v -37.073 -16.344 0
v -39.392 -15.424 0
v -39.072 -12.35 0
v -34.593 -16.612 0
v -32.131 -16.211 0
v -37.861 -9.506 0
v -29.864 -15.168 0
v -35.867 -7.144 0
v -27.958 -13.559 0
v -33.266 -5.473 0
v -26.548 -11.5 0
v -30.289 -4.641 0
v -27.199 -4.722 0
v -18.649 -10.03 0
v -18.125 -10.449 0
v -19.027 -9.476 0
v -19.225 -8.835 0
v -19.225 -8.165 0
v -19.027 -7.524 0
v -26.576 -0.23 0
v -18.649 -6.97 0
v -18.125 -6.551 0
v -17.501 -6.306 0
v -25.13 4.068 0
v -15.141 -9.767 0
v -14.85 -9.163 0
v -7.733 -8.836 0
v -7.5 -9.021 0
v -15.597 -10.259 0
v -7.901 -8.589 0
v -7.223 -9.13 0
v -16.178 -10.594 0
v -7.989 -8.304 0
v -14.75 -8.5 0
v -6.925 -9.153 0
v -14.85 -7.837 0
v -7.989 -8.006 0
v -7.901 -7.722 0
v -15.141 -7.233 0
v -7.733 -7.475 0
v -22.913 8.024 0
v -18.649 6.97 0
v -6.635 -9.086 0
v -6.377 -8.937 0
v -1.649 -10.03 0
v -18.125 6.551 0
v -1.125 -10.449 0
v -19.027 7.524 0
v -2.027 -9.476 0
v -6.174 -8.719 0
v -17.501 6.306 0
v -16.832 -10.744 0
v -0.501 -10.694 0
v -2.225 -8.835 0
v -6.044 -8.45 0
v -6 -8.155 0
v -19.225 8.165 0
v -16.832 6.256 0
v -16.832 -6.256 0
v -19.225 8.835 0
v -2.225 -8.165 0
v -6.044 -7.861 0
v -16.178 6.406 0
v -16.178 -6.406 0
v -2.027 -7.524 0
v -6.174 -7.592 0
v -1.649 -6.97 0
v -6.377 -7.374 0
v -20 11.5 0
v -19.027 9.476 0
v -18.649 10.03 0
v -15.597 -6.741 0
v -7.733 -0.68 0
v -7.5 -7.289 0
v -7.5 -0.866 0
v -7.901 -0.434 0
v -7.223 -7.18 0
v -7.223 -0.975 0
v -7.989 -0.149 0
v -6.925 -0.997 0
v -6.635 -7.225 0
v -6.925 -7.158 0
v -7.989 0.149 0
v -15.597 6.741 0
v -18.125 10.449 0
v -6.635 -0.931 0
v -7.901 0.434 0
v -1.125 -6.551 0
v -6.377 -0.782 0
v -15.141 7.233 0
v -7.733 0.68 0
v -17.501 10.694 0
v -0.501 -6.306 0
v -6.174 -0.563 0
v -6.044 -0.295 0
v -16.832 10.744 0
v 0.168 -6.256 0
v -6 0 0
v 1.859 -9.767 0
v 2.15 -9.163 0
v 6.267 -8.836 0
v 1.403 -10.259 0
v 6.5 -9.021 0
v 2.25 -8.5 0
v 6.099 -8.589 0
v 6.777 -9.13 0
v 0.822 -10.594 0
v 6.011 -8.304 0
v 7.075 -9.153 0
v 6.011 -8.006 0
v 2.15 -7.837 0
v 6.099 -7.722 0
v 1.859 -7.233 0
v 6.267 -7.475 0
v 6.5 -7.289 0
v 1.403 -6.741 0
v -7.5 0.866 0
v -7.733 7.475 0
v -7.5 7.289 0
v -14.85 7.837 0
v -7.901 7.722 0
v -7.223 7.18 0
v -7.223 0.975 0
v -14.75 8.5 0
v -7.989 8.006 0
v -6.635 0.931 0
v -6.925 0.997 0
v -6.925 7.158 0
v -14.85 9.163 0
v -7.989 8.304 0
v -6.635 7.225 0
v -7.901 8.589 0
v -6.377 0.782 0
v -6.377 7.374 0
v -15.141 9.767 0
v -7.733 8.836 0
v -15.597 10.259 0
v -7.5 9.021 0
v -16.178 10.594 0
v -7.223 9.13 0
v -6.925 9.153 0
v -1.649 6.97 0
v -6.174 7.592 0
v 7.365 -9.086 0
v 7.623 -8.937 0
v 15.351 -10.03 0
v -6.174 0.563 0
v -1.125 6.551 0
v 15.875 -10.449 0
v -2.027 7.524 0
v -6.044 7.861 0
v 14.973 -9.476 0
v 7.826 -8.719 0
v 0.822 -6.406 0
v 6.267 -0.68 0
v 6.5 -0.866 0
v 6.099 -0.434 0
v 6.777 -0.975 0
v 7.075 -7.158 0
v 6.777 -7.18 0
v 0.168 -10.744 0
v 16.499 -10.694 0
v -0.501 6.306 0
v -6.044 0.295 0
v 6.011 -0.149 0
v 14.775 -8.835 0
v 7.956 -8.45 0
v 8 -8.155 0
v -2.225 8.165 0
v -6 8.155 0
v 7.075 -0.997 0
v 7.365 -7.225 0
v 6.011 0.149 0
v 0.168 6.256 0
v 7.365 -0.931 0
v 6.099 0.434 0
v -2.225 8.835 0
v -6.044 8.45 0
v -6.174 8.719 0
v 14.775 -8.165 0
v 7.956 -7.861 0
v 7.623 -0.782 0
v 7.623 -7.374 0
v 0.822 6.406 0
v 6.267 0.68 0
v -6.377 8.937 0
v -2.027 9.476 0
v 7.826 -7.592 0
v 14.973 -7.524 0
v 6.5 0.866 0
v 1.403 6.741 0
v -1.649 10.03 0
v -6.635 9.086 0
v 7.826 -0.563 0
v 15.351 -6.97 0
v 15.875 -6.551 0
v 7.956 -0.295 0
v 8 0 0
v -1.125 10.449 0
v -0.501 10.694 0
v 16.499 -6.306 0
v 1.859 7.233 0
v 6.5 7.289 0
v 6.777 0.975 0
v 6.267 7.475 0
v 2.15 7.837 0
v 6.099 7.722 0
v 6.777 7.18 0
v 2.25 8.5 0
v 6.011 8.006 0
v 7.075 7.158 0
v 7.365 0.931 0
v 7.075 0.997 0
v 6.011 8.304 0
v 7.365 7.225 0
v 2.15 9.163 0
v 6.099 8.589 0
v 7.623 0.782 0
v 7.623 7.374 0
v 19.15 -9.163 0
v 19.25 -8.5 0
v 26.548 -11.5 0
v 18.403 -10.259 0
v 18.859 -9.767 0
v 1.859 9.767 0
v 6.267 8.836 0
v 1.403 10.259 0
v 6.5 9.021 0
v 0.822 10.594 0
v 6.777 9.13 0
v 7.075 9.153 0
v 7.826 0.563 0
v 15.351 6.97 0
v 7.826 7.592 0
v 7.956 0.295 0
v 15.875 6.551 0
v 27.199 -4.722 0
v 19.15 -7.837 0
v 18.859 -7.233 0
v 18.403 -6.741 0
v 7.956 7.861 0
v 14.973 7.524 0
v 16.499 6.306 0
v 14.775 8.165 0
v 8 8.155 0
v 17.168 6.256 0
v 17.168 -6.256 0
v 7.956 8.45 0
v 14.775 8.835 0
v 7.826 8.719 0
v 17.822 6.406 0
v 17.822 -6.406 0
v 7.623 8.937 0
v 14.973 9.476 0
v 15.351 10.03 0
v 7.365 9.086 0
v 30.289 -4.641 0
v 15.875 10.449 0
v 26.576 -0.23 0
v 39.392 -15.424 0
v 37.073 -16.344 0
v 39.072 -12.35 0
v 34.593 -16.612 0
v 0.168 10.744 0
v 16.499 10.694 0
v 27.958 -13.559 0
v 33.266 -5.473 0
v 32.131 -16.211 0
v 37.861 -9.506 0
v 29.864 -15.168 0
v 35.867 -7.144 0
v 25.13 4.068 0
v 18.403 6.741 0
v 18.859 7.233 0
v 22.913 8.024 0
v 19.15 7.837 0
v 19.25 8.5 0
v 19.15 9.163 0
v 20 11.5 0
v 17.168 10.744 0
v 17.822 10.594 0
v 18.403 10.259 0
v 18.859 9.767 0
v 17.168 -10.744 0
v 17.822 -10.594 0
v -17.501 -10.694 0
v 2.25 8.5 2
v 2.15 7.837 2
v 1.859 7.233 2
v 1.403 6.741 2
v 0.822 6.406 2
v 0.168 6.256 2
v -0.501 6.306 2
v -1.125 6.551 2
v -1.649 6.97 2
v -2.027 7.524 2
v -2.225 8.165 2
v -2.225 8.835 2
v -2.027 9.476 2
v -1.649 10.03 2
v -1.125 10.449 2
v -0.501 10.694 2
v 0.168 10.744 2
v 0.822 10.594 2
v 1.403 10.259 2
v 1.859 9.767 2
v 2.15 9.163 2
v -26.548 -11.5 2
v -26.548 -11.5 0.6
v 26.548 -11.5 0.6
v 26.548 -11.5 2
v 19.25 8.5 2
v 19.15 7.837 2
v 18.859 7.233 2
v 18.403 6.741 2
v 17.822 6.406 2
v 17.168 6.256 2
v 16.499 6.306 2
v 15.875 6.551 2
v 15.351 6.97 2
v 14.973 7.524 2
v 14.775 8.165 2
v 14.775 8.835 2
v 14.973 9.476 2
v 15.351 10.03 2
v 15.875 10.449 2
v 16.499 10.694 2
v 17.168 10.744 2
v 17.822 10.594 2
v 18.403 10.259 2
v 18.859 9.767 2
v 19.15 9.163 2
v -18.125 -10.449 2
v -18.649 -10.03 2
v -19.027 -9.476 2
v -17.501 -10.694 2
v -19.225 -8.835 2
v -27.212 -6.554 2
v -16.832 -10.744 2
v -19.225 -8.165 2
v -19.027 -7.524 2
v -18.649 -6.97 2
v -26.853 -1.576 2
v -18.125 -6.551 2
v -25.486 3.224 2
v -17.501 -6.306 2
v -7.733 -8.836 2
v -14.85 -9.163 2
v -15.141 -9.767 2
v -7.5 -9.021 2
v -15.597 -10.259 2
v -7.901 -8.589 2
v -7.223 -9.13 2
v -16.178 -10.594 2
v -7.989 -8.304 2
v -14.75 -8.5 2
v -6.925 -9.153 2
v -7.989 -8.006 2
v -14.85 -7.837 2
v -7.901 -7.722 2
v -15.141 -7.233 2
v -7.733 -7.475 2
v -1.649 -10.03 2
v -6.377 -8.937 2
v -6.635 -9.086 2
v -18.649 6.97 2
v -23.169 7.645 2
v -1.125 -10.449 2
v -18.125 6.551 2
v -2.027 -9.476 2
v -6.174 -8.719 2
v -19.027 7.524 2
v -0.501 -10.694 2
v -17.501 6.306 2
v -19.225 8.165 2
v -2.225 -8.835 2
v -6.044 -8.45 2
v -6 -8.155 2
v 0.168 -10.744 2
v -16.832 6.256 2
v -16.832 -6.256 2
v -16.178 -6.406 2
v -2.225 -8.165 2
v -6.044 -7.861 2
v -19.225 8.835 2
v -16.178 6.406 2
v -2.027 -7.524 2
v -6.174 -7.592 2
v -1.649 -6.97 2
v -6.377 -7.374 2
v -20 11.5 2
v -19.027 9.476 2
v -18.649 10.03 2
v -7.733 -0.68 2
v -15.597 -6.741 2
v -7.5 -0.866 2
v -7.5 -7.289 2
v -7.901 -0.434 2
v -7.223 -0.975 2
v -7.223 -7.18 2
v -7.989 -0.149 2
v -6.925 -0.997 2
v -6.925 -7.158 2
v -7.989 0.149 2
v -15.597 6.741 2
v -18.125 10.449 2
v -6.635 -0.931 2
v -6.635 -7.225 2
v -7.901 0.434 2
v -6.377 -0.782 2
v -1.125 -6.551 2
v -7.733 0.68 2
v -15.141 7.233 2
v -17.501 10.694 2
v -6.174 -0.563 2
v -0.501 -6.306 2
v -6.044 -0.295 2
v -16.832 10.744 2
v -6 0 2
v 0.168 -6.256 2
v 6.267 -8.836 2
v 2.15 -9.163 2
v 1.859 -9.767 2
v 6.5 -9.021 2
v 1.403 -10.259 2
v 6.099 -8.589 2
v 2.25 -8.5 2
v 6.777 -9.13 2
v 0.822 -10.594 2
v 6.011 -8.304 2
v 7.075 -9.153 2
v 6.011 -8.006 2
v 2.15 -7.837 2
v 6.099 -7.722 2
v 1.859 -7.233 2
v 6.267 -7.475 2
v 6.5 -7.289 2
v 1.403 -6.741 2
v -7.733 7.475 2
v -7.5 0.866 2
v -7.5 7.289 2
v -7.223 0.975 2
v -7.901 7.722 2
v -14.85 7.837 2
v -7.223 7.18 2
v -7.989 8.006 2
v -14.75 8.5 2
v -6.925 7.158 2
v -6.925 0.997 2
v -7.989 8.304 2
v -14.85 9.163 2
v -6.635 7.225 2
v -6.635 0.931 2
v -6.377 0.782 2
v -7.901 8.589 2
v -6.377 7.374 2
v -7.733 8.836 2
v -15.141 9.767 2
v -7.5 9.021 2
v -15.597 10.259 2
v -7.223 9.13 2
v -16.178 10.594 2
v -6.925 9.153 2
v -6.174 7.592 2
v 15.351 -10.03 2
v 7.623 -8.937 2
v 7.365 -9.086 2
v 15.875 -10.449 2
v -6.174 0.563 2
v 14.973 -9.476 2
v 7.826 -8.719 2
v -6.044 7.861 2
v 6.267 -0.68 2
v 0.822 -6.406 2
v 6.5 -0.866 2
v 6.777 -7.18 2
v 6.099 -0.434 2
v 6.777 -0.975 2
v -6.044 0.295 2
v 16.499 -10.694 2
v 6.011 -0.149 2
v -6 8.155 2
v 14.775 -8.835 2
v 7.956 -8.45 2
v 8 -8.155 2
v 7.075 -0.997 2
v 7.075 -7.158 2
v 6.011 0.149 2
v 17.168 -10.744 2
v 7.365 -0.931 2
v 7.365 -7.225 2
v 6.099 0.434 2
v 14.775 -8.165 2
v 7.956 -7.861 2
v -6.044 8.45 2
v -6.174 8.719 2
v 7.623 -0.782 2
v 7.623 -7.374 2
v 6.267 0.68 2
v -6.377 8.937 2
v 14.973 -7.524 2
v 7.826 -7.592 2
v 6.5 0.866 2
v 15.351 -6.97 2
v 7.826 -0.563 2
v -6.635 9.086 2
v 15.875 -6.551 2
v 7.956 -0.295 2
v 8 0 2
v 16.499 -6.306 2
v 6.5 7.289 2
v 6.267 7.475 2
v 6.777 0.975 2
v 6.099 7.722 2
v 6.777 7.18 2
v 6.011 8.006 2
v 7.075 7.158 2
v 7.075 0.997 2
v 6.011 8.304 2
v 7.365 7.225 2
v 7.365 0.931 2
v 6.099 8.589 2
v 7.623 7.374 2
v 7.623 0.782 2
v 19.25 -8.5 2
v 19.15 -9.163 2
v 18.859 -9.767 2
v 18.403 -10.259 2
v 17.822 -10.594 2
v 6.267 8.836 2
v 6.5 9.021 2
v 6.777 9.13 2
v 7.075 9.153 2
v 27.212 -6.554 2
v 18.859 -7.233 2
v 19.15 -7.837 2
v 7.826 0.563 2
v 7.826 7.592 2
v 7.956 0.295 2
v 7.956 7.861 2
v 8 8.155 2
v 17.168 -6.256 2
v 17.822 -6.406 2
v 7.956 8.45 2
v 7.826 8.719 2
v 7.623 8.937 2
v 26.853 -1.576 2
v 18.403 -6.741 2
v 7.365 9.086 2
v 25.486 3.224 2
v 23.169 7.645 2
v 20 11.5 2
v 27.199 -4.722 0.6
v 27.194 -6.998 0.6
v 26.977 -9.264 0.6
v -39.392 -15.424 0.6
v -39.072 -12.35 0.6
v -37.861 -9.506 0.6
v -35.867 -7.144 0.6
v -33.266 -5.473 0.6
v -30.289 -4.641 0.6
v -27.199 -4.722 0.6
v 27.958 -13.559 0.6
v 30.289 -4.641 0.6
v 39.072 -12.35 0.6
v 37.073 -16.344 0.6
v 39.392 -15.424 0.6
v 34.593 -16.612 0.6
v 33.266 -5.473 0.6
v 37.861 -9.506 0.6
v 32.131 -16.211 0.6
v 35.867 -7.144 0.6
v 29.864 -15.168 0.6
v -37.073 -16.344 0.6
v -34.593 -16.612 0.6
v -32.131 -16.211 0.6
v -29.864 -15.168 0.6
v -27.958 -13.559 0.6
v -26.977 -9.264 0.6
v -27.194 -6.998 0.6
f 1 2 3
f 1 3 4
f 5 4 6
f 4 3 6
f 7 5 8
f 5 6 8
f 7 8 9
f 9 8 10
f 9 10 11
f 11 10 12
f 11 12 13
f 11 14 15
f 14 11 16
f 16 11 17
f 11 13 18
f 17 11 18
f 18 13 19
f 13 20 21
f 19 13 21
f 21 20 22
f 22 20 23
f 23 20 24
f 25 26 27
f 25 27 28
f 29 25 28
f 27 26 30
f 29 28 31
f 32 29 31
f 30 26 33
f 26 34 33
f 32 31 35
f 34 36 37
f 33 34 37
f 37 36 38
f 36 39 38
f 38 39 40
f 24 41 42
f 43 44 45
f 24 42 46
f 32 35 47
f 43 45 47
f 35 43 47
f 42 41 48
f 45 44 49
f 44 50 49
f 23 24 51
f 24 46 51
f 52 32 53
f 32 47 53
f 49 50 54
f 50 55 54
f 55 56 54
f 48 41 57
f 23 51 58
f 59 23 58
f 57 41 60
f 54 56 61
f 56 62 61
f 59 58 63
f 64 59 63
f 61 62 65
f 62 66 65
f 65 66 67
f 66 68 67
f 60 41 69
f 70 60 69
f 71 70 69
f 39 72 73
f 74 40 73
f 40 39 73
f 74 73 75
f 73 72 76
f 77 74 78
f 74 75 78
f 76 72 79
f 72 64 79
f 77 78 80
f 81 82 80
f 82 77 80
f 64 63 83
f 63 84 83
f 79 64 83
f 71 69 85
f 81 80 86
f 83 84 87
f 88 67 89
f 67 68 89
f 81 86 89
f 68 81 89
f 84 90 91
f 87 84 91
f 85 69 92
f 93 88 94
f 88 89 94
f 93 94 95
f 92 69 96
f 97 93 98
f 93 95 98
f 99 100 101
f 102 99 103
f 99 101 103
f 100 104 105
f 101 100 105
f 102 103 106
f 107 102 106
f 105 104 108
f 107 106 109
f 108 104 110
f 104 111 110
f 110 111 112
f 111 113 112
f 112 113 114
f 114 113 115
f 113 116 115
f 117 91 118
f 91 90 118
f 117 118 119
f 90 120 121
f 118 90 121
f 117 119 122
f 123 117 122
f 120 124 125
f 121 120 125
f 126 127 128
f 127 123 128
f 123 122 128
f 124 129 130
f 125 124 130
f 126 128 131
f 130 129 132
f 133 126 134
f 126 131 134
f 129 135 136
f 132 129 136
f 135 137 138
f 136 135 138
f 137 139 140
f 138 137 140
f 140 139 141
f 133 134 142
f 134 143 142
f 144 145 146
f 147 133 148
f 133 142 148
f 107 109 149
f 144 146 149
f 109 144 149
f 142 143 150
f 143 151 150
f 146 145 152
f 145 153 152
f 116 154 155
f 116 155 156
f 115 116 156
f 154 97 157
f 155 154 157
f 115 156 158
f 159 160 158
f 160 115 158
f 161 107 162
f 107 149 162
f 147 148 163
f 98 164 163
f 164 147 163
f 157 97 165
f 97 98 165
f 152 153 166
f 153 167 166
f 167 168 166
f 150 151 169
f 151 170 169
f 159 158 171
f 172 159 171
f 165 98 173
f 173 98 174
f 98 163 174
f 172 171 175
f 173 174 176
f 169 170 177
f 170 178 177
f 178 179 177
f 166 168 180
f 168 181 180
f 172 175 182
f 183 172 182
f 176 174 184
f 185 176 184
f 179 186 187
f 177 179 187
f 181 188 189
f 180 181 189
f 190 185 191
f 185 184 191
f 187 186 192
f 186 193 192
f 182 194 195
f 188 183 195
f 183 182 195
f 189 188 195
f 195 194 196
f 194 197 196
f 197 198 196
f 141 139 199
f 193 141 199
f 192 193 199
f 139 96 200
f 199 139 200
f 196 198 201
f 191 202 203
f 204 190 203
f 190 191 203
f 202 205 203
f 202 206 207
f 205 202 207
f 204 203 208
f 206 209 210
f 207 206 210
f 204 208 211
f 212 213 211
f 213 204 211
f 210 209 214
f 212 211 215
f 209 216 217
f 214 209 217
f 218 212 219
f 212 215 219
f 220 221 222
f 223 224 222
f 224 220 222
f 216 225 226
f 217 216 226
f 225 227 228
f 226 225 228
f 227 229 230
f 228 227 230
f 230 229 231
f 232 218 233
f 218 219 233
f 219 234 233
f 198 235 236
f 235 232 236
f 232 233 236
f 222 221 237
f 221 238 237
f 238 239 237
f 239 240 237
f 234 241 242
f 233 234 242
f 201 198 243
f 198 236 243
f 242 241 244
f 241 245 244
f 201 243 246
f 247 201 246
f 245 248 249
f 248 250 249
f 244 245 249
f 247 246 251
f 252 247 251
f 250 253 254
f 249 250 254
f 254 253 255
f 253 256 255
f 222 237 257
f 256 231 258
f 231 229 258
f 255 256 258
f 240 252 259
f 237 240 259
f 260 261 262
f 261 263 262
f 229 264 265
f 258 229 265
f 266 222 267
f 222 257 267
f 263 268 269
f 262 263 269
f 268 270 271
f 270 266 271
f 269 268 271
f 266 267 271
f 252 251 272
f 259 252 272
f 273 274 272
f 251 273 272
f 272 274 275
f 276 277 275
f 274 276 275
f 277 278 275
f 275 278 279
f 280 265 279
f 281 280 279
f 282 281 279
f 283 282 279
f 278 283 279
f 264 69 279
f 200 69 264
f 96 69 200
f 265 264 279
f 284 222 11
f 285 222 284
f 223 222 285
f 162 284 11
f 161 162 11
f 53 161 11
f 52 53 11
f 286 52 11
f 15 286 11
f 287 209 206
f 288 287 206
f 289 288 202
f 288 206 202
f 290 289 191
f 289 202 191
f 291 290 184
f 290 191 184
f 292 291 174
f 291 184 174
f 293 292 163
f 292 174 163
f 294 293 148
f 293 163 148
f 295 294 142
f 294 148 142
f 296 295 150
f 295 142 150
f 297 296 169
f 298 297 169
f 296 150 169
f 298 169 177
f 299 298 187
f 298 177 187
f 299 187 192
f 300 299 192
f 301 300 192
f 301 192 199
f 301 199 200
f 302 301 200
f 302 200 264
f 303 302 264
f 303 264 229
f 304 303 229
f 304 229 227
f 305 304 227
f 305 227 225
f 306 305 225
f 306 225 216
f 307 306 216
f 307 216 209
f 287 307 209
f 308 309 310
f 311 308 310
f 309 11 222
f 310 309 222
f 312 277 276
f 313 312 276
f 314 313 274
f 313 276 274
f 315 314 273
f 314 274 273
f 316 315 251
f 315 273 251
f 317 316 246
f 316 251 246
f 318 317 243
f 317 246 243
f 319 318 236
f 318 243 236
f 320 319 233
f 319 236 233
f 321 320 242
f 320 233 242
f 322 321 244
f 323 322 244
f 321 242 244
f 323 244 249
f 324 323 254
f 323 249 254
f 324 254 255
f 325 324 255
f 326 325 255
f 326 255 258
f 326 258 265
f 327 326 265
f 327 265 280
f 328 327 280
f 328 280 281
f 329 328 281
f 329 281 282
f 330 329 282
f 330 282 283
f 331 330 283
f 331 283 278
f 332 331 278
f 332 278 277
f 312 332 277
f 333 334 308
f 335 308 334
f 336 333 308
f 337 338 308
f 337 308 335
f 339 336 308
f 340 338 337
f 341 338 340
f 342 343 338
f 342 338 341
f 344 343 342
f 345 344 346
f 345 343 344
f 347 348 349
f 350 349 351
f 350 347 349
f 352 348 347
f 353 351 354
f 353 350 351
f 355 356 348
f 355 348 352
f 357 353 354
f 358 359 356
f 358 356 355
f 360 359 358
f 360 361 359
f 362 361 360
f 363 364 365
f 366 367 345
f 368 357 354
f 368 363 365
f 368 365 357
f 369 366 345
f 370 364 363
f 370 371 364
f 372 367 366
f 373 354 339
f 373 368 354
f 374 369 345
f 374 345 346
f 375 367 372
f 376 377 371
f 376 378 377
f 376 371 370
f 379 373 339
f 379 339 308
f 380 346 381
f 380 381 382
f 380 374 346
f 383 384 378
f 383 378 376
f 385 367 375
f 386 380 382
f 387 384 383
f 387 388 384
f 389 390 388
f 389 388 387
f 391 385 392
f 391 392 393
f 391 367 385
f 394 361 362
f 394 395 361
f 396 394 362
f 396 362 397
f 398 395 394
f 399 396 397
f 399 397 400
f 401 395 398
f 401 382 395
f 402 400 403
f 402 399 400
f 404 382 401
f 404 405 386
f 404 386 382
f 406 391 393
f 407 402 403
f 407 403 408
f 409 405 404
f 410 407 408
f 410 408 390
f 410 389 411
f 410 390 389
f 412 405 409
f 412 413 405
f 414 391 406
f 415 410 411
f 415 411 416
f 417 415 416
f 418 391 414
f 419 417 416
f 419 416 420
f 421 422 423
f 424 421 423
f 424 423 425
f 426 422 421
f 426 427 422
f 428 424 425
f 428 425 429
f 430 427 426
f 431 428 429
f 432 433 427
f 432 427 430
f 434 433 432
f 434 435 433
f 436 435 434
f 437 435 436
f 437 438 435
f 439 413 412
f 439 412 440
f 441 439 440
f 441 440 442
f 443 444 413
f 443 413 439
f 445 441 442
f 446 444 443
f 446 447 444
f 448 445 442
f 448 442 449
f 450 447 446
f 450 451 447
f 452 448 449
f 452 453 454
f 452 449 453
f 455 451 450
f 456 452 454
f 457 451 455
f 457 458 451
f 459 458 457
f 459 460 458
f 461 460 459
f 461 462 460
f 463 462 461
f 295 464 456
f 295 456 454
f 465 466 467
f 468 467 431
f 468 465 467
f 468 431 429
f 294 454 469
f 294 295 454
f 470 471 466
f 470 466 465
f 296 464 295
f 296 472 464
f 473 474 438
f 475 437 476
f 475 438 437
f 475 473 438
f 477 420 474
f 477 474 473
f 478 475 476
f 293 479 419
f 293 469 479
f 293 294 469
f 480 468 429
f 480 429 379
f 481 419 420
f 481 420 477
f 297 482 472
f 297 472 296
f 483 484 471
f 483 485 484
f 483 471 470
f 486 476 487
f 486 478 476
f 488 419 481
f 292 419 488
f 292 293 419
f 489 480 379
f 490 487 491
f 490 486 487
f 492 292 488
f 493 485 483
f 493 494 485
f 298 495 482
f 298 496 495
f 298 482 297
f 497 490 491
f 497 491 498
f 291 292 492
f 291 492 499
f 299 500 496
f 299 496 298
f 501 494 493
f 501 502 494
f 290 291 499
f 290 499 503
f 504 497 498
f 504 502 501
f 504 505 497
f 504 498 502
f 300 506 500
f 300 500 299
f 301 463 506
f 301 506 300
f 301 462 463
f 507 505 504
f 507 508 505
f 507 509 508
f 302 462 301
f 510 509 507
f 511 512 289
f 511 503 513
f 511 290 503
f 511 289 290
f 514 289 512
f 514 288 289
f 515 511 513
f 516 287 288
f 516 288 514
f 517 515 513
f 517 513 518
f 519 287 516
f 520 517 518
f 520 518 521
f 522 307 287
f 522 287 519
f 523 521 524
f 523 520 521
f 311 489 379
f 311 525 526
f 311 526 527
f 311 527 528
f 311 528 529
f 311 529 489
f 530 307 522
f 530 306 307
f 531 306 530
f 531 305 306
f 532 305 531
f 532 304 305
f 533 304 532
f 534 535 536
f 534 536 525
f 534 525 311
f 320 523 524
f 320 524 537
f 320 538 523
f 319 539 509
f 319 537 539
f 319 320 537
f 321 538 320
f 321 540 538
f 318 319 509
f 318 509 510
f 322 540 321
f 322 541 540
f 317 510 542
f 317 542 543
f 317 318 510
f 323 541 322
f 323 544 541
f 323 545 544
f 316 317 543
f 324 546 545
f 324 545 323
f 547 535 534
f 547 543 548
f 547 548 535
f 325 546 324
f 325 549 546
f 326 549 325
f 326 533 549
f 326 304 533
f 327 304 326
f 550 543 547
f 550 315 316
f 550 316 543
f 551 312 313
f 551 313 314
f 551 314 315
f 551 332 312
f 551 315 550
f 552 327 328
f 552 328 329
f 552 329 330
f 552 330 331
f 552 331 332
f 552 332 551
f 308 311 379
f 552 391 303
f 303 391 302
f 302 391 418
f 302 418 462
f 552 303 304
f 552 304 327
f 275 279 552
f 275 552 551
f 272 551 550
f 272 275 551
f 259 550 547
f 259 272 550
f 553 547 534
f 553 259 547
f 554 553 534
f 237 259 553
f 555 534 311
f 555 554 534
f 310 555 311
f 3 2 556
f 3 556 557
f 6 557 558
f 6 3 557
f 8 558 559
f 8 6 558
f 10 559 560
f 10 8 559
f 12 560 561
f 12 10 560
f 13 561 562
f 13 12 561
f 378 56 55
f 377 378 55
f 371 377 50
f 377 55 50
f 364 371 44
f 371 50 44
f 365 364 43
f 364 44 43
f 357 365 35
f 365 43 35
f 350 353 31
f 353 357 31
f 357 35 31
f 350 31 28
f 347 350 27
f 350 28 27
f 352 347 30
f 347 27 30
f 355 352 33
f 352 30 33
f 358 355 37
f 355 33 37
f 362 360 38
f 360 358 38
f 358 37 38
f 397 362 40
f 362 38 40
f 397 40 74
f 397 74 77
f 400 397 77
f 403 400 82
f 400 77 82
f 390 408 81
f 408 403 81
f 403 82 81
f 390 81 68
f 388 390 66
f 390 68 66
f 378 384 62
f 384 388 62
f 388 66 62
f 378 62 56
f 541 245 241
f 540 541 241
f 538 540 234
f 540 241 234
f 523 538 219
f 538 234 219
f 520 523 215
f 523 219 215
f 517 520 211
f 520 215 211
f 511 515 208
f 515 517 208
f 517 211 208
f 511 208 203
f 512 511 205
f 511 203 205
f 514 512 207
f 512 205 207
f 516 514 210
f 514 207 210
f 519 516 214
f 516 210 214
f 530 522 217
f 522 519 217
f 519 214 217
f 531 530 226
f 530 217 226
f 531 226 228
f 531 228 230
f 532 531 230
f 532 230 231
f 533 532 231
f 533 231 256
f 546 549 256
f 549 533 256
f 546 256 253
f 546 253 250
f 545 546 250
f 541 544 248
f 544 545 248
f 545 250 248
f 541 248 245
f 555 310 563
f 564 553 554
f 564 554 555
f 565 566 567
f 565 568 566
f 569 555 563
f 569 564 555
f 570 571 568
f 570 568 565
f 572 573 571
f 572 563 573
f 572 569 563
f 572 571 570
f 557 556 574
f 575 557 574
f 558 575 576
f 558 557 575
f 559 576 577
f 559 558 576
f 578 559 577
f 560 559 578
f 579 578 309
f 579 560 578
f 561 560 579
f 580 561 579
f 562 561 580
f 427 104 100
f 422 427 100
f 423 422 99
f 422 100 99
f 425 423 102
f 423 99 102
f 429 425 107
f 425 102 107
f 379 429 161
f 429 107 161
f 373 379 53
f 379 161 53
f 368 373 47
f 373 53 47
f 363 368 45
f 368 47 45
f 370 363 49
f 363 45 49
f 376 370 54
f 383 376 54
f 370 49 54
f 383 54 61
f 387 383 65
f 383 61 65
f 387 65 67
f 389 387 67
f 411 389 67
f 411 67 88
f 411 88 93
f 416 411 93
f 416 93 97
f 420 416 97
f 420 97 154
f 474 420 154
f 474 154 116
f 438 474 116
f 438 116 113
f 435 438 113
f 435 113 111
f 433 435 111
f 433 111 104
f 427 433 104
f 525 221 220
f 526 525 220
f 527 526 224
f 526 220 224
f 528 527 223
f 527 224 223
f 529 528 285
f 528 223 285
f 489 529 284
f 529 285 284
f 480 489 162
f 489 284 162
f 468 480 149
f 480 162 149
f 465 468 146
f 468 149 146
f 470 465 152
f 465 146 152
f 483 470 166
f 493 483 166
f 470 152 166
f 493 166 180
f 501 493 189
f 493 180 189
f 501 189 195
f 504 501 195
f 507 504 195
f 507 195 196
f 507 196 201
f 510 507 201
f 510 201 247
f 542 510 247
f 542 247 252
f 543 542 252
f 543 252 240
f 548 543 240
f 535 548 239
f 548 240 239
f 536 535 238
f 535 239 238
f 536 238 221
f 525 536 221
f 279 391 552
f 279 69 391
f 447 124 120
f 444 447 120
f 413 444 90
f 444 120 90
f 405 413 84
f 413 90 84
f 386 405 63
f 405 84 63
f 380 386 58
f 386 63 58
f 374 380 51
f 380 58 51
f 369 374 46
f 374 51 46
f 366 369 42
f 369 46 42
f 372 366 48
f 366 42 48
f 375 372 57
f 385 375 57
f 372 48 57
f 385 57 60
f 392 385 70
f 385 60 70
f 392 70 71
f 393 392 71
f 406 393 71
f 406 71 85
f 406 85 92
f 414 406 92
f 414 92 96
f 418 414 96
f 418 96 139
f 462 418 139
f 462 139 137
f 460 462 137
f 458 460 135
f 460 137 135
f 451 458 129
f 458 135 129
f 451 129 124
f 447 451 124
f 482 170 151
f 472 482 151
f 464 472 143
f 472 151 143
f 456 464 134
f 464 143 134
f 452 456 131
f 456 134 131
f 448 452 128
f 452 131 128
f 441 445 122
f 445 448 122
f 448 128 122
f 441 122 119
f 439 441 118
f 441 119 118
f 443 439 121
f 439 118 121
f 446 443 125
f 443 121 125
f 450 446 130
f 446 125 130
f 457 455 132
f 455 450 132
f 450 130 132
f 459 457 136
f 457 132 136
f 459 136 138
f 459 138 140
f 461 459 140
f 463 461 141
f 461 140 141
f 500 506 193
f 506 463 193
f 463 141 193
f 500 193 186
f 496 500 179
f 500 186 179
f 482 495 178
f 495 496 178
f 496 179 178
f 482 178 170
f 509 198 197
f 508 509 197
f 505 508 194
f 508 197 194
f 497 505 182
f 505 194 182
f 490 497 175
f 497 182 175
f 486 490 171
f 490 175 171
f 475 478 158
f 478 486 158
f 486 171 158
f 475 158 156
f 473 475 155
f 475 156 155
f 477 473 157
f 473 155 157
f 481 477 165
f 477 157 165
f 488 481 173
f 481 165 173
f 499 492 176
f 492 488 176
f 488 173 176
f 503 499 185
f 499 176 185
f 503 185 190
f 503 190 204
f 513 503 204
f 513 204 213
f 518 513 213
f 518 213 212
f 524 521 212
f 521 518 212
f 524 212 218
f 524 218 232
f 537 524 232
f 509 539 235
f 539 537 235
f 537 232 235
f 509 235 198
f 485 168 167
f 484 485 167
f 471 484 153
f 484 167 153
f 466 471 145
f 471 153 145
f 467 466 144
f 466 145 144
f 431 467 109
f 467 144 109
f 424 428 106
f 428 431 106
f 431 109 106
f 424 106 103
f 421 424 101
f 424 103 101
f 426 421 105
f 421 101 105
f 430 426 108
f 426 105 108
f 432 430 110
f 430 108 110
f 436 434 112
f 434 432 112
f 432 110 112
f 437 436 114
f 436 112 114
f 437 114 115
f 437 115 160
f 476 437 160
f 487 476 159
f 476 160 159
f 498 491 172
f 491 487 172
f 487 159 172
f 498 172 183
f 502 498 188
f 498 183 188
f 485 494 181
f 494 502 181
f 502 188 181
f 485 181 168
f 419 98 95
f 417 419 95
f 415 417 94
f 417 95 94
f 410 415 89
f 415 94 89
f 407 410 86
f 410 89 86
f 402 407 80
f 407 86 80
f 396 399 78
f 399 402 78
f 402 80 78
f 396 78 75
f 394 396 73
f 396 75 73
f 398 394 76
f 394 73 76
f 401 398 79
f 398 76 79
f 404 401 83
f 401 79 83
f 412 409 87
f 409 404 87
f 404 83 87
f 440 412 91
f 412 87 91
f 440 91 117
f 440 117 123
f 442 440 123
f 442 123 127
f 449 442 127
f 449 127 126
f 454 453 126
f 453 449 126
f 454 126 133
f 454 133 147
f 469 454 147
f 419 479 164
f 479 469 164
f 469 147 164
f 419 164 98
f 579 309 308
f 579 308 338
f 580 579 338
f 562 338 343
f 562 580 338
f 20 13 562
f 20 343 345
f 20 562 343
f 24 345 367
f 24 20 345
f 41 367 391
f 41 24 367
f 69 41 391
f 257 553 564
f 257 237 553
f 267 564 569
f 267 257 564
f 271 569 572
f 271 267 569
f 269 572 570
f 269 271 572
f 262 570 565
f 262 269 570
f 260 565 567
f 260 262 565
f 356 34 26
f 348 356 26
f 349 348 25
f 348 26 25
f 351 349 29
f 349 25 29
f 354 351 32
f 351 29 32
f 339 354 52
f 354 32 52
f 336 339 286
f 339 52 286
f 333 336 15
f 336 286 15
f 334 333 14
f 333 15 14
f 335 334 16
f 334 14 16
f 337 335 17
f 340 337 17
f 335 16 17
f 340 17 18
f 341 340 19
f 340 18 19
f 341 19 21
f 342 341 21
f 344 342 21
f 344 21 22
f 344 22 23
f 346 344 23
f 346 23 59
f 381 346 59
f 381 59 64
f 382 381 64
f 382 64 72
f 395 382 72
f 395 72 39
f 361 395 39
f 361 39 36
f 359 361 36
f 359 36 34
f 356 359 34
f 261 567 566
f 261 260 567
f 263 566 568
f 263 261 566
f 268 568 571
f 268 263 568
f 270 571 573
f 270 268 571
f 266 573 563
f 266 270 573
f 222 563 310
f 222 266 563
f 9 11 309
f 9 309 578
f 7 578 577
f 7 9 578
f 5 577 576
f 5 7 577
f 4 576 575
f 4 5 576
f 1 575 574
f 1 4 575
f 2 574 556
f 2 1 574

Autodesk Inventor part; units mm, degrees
ref_plane "YZ Plane" through (0, 0, 0) normal (1, 0, 0) x (0, 1, 0)
ref_plane "XZ Plane" through (0, 0, 0) normal (0, 1, 0) x (-1, 0, 0)
ref_plane "XY Plane" through (0, 0, 0) normal (0, 0, 1) x (1, 0, 0)
sketch "Block1" plane through (0, 0, 0) normal (0, 0, 1) x (1, 0, 0)
  line L0 (22.5674, 54.9733) -> (22.5674, 26.9733) construction
  line L1 (62.5674, 54.9733) -> (62.5674, 26.9733) construction
  line L2 (42.5674, 54.9733) -> (42.5674, 26.9733) construction
  arc A0 (22.5674, 54.9733) -> (16.0189, 31.9733) centre (39.6923, 37.6653) ccw
  arc A1 (69.116, 31.9733) -> (62.5674, 54.9733) centre (45.4425, 37.6653) ccw
  line L3 (67.5674, 31.9733) -> (69.116, 31.9733)
  line L4 (22.5674, 54.9733) -> (62.5674, 54.9733)
  arc A2 (3.175, 28.049) -> (16.0189, 31.9733) centre (7.7246, 36.1392) ccw
  arc A3 (15.3685, 38.7512) -> (3.175, 28.049) centre (13.5542, 28.5209) ccw
  arc A4 (69.116, 31.9733) -> (81.9598, 28.049) centre (77.4102, 36.1392) ccw
  arc A5 (81.9598, 28.049) -> (69.7664, 38.7512) centre (71.5807, 28.5209) ccw
  line L5 (17.5674, 54.9733) -> (67.5674, 54.9733) construction
  line L6 (67.5674, 54.9733) -> (67.5674, 31.9733) construction
  line L7 (67.5674, 31.9733) -> (16.0189, 31.9733)
  line L8 (17.5674, 31.9733) -> (17.5674, 54.9733) construction
  line L9 (22.5674, 31.9733) -> (62.5674, 31.9733)
  line L10 (62.5674, 31.9733) -> (62.5674, 26.9733)
  line L11 (62.5674, 26.9733) -> (22.5674, 26.9733)
  line L12 (22.5674, 26.9733) -> (22.5674, 31.9733)
  circle A6 centre (35.5674, 51.6287) radius 1
  circle A7 centre (49.5674, 51.6287) radius 1
  line L13 (22.5674, 29.4733) -> (62.5674, 29.4733) construction
  circle A8 centre (35.5674, 29.4733) radius 1
  circle A9 centre (49.5674, 29.4733) radius 1
  point P0 (42.5377, 37.3132)
  point P1 (42.5674, 31.9733)
  point P2 (42.5674, 31.9733)
  point P3 (17.5674, 26.9733)
  point P4 (67.5674, 26.9733)
  dimension "d0" = 23
  dimension "d1" = 5
  dimension "d2" = 40
  dimension "d3" = 2
  dimension "d4" = 2
  dimension "d5" = 7
  dimension "d6" = 7
  dimension "d7" = 2
  dimension "d8" = 2
  dimension "d9" = 7
  dimension "d10" = 7
sketch "Sketch1" plane through (0, 0, 0) normal (0, 0, 1) x (1, 0, 0)
  line L0 (-20, 11.5) -> (-20, -16.5) construction
  line L1 (20, 11.5) -> (20, -16.5) construction
  line L2 (0, 11.5) -> (0, -16.5) construction
  arc A0 (-20, 11.5) -> (-26.5485, -11.5) centre (-2.8751, -5.808) ccw
  arc A1 (26.5485, -11.5) -> (20, 11.5) centre (2.8751, -5.808) ccw
  line L3 (25, -11.5) -> (26.5485, -11.5)
  line L4 (-20, 11.5) -> (20, 11.5)
  arc A2 (-39.3924, -15.4242) -> (-26.5485, -11.5) centre (-34.8428, -7.334) ccw
  arc A3 (-27.199, -4.7221) -> (-39.3924, -15.4242) centre (-29.0132, -14.9523) ccw
  arc A4 (26.5485, -11.5) -> (39.3924, -15.4242) centre (34.8428, -7.334) ccw
  arc A5 (39.3924, -15.4242) -> (27.199, -4.7221) centre (29.0132, -14.9523) ccw
  line L5 (-25, 11.5) -> (25, 11.5) construction
  line L6 (25, 11.5) -> (25, -11.5) construction
  line L7 (25, -11.5) -> (-26.5485, -11.5)
  line L8 (-25, -11.5) -> (-25, 11.5) construction
  line L9 (-20, -11.5) -> (20, -11.5)
  line L10 (20, -11.5) -> (20, -16.5)
  line L11 (20, -16.5) -> (-20, -16.5)
  line L12 (-20, -16.5) -> (-20, -11.5)
  circle A6 centre (-7, 8.1554) radius 1
  circle A7 centre (7, 8.1554) radius 1
  line L13 (-20, -14) -> (20, -14) construction
  circle A8 centre (-7, -14) radius 1
  circle A9 centre (7, -14) radius 1
  circle A10 centre (-17, -8.5) radius 2.25
  circle A11 centre (17, -8.5) radius 2.25
  circle A12 centre (0, -8.5) radius 2.25
  line L14 (-25, 0) -> (25, 0) construction
  circle A13 centre (-7, 0) radius 1
  circle A14 centre (7, 0) radius 1
  circle A15 centre (-7, -8.1554) radius 1
  circle A16 centre (7, -8.1554) radius 1
  point P0 (0, 0)
  point P1 (0, -11.5)
  point P2 (0, -11.5)
  point P3 (-27.9814, 24.963)
  point P4 (27.9814, 24.963)
  point P5 (0, -2.5)
  point P6 (0, 0)
  dimension "d12" = 23
  dimension "d13" = 5
  dimension "d14" = 40
  dimension "d15" = 2
  dimension "d16" = 2
  dimension "d17" = 7
  dimension "d18" = 7
  dimension "d19" = 2
  dimension "d20" = 2
  dimension "d21" = 7
  dimension "d22" = 7
  dimension "d24" = 4.5
  dimension "d25" = 4.5
  dimension "d26" = 3
  dimension "d27" = 3
  dimension "d28" = 3
  dimension "d29" = 3
  dimension "d34" = 4.5
  dimension "d35" = 3
  dimension "d38" = 3.3446
  dimension "d39" = 3.3446
  dimension "d40" = 2
  dimension "d41" = 2
  dimension "d42" = 7
  dimension "d43" = 7
extrude "Extrusion1" add sketch "Sketch1" along normal blind 2 contours L4 A1 L3 L7 A0 | A10 | A11 | A12
extrude "Extrusion2" add sketch "Sketch1" along normal blind 0.6 contours A0 A2 A3
mirror "Mirror1" about plane through (0, 0, 0) normal (1, 0, 0) of "Extrusion2"
extrude "Extrusion3" cut sketch "Sketch1" along normal blind 5 contours A10 | A11 | A12
mirror "Mirror2" about plane through (0, 0, 0) normal (0, 1, 0) of "Extrusion3"
equation "\"d3\" = d11"
equation "\"d4\" = d11"
equation "\"d7\" = d11"
equation "\"d8\" = d11"
equation "\"d15\" = fishing"
equation "\"d16\" = fishing"
equation "\"d19\" = fishing"
equation "\"d20\" = fishing"
equation "\"d40\" = fishing"
equation "\"d41\" = fishing"
equation "\"d11\" = 2"
equation "\"d23\" = 2"
equation "\"fishing\" = 2"
properties part number "Piece"
